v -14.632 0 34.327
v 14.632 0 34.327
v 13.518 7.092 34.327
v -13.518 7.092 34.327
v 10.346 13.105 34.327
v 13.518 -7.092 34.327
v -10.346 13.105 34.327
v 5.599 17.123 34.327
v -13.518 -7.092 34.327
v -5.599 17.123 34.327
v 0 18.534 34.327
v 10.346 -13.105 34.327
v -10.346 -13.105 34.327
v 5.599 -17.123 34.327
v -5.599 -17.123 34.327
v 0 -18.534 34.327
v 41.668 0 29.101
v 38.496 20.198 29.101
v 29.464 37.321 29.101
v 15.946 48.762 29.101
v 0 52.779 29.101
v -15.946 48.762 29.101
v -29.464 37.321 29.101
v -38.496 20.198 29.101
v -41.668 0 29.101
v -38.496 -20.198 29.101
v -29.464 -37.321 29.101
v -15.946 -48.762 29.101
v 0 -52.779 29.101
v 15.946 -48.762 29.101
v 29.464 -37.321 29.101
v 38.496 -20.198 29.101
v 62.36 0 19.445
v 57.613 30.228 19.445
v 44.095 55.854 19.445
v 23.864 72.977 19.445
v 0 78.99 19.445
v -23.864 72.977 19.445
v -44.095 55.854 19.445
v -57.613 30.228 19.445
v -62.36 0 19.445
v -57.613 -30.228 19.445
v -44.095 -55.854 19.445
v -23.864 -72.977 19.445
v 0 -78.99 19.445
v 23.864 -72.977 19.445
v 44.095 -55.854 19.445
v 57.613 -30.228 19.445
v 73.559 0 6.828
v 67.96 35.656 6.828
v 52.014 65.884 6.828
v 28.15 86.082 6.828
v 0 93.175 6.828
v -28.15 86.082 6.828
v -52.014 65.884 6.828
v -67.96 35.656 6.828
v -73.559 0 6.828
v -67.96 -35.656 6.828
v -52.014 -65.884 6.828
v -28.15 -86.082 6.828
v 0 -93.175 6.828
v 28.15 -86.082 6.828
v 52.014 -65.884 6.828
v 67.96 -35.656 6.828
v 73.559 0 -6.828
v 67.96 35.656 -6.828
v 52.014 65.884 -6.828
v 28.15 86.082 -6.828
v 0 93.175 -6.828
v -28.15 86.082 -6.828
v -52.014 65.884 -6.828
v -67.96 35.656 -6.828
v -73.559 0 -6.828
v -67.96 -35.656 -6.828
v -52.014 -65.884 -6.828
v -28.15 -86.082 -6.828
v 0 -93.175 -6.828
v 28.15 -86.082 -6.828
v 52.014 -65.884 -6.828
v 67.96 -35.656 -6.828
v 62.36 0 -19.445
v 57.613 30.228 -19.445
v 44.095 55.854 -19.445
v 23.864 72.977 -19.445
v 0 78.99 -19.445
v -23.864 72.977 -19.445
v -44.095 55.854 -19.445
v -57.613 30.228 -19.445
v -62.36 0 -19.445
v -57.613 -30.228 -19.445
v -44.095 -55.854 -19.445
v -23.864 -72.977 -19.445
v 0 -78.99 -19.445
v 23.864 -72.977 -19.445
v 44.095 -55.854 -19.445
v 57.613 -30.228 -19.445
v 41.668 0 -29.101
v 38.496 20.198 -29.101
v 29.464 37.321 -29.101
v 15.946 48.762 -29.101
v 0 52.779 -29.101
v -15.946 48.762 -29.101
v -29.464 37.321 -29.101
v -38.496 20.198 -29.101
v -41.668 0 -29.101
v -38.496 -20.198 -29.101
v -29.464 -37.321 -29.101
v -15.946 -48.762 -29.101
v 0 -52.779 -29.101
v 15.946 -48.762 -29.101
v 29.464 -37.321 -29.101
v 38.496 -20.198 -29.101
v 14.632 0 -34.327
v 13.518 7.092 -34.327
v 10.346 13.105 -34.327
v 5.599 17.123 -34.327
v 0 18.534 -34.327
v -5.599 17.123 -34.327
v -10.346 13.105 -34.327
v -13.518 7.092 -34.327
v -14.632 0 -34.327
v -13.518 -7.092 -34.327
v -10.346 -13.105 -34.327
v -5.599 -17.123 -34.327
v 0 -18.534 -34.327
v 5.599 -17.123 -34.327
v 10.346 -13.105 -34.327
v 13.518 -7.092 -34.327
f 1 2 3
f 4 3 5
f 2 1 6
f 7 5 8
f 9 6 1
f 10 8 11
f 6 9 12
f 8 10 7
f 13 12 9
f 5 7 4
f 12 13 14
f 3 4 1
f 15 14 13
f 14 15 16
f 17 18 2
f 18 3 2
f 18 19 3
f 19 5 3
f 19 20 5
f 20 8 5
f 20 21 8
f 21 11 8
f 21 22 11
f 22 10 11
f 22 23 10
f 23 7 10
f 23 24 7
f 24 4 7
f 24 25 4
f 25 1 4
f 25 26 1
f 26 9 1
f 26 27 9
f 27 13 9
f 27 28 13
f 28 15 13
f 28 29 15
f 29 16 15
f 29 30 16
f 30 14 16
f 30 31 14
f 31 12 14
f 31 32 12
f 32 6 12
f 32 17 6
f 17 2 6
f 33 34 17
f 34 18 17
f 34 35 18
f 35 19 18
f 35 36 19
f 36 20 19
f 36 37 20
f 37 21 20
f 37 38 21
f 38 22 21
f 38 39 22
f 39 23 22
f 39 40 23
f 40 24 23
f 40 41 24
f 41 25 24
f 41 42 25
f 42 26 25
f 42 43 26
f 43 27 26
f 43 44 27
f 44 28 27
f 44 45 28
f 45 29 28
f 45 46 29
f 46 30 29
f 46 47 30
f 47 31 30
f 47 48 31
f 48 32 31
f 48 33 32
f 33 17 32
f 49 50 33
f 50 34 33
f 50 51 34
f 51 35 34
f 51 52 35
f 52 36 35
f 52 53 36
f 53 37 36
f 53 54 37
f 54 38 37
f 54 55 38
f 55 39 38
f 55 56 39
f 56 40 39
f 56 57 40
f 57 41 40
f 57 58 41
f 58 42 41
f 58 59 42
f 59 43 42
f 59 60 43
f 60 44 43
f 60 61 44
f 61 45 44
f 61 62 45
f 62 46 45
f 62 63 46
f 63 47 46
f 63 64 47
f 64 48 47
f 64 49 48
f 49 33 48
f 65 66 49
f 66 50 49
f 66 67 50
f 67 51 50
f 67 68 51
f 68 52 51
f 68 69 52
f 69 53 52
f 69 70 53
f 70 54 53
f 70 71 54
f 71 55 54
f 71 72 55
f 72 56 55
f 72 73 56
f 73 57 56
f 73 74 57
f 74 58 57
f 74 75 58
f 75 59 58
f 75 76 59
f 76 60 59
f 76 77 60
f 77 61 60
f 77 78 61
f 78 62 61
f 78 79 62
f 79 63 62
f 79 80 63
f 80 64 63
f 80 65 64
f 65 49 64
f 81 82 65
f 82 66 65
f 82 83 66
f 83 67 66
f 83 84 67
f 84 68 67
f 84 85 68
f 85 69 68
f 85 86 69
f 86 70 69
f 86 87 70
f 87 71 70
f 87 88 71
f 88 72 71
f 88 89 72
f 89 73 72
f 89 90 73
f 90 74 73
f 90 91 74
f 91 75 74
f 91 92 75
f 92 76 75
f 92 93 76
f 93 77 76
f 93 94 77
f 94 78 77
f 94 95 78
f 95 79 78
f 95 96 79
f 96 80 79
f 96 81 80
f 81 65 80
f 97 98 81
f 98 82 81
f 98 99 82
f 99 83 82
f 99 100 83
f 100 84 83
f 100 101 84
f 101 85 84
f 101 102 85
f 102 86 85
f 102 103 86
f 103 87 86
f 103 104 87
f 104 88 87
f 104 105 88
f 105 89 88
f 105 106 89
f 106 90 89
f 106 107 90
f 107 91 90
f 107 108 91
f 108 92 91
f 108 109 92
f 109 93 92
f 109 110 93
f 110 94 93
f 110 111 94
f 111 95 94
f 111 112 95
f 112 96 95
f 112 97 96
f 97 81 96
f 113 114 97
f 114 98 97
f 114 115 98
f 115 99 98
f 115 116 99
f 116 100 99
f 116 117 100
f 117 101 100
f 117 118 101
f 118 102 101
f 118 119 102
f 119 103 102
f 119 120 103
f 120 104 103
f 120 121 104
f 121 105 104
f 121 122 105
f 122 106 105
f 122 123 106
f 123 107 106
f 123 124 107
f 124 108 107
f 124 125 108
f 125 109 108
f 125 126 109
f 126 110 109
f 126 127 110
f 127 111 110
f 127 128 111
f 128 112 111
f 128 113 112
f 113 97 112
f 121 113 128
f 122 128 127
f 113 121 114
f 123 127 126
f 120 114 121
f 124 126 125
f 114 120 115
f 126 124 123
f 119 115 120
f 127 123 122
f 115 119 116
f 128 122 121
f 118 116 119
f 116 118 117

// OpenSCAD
// Generated by SolidPython 1.0.1 on 2020-07-29 00:46:52


scale(v = [15, 19, 7]) {
	sphere(r = 5);
}
/***********************************************
*********      SolidPython code:      **********
************************************************
 
# import packages: SolidPython
from solid import *
from solid.utils import *
from itertools import chain, combinations, permutations


class Resize:

    def __init__(self, scad_file):
        self.scad_file = scad_file
        #self.scad_file = import_scad(scad_file)
        # cone/cylinder param:
        self.r1 = 0
        self.r2 = 0
        self.h = 0
        # rectangular prism param:
        self.w = 0
        self.l = 0
        # ellipse param:
        self.r = 0

    # import OpenScad code (file name corresponds to shape)


    # classify shape + parameters
    def assign(self, param1, param2, param3):
        if self.scad_file == 'cone.scad':
            self.r1 = param1
            self.r2 = param2
            self.h = param3
        elif self.scad_file == 'cylinder.scad':
            self.r1 = param1
            self.r2 = param2
            self.h = param3
        elif self.scad_file == 'rectangularPrism.scad':
            self.h = param1
            self.l = param2
            self.w = param3
        else:
            self.r = param1
            self.h = param2

    # resize parameters
    def iterate(self):
        x = range(3, 20, 2)
        i = 1
        if self.scad_file == 'cone.scad':
            tempList = list(permutations(x, 2))
            for temp in tempList:
                param1 = temp[0]
                param2 = temp[1]
                filepath = 'produced_scad_files/' + 'cone' + str(param1) + '_' + str(param2) + '_' + '.scad'
                scad_render_to_file(cylinder(h=param1, r1=param2, r2=0), filepath)

        elif self.scad_file == 'cylinder.scad':
            tempList = list(permutations(x, 3))
            for temp in tempList:
                param1 = temp[0]
                param2 = temp[1]
                filepath = 'produced_scad_files/' + 'cylinder' + str(param1) + '_' + str(param2) + '_' + '.scad'
                scad_render_to_file(cylinder(h=param1, r1=param2, r2=param2), filepath)

        elif self.scad_file == 'rectangularPrism.scad':
            tempList = list(permutations(x, 3))
            for temp in tempList:
                param1 = temp[0]
                param2 = temp[1]
                param3 = temp[2]
                filepath = 'produced_scad_files/' + 'rectangularPrism' + str(param1) + '_' + str(param2) + '_' + str(
                    param3) + '.scad'
                scad_render_to_file(cube(size=(param1, param2, param3)), filepath)

        elif self.scad_file == 'ellipse.scad':
            tempList = list(permutations(x, 4))
            for temp in tempList:
                param1 = temp[0]
                param2 = temp[1]
                param3 = temp[2]
                param4 = temp[3]
                filepath = 'produced_scad_files/' + 'ellipse' + str(param1) + '_' + str(param2) + '_' + str(param3) + '_' + str(param4) + '.scad'
                scad_render_to_file(scale([param1, param2, param3])(sphere(r=param4)), filepath)

    def render_to_scadfile(self):
        scad_render_to_file(scad, 'example.scad') 
 
************************************************/
